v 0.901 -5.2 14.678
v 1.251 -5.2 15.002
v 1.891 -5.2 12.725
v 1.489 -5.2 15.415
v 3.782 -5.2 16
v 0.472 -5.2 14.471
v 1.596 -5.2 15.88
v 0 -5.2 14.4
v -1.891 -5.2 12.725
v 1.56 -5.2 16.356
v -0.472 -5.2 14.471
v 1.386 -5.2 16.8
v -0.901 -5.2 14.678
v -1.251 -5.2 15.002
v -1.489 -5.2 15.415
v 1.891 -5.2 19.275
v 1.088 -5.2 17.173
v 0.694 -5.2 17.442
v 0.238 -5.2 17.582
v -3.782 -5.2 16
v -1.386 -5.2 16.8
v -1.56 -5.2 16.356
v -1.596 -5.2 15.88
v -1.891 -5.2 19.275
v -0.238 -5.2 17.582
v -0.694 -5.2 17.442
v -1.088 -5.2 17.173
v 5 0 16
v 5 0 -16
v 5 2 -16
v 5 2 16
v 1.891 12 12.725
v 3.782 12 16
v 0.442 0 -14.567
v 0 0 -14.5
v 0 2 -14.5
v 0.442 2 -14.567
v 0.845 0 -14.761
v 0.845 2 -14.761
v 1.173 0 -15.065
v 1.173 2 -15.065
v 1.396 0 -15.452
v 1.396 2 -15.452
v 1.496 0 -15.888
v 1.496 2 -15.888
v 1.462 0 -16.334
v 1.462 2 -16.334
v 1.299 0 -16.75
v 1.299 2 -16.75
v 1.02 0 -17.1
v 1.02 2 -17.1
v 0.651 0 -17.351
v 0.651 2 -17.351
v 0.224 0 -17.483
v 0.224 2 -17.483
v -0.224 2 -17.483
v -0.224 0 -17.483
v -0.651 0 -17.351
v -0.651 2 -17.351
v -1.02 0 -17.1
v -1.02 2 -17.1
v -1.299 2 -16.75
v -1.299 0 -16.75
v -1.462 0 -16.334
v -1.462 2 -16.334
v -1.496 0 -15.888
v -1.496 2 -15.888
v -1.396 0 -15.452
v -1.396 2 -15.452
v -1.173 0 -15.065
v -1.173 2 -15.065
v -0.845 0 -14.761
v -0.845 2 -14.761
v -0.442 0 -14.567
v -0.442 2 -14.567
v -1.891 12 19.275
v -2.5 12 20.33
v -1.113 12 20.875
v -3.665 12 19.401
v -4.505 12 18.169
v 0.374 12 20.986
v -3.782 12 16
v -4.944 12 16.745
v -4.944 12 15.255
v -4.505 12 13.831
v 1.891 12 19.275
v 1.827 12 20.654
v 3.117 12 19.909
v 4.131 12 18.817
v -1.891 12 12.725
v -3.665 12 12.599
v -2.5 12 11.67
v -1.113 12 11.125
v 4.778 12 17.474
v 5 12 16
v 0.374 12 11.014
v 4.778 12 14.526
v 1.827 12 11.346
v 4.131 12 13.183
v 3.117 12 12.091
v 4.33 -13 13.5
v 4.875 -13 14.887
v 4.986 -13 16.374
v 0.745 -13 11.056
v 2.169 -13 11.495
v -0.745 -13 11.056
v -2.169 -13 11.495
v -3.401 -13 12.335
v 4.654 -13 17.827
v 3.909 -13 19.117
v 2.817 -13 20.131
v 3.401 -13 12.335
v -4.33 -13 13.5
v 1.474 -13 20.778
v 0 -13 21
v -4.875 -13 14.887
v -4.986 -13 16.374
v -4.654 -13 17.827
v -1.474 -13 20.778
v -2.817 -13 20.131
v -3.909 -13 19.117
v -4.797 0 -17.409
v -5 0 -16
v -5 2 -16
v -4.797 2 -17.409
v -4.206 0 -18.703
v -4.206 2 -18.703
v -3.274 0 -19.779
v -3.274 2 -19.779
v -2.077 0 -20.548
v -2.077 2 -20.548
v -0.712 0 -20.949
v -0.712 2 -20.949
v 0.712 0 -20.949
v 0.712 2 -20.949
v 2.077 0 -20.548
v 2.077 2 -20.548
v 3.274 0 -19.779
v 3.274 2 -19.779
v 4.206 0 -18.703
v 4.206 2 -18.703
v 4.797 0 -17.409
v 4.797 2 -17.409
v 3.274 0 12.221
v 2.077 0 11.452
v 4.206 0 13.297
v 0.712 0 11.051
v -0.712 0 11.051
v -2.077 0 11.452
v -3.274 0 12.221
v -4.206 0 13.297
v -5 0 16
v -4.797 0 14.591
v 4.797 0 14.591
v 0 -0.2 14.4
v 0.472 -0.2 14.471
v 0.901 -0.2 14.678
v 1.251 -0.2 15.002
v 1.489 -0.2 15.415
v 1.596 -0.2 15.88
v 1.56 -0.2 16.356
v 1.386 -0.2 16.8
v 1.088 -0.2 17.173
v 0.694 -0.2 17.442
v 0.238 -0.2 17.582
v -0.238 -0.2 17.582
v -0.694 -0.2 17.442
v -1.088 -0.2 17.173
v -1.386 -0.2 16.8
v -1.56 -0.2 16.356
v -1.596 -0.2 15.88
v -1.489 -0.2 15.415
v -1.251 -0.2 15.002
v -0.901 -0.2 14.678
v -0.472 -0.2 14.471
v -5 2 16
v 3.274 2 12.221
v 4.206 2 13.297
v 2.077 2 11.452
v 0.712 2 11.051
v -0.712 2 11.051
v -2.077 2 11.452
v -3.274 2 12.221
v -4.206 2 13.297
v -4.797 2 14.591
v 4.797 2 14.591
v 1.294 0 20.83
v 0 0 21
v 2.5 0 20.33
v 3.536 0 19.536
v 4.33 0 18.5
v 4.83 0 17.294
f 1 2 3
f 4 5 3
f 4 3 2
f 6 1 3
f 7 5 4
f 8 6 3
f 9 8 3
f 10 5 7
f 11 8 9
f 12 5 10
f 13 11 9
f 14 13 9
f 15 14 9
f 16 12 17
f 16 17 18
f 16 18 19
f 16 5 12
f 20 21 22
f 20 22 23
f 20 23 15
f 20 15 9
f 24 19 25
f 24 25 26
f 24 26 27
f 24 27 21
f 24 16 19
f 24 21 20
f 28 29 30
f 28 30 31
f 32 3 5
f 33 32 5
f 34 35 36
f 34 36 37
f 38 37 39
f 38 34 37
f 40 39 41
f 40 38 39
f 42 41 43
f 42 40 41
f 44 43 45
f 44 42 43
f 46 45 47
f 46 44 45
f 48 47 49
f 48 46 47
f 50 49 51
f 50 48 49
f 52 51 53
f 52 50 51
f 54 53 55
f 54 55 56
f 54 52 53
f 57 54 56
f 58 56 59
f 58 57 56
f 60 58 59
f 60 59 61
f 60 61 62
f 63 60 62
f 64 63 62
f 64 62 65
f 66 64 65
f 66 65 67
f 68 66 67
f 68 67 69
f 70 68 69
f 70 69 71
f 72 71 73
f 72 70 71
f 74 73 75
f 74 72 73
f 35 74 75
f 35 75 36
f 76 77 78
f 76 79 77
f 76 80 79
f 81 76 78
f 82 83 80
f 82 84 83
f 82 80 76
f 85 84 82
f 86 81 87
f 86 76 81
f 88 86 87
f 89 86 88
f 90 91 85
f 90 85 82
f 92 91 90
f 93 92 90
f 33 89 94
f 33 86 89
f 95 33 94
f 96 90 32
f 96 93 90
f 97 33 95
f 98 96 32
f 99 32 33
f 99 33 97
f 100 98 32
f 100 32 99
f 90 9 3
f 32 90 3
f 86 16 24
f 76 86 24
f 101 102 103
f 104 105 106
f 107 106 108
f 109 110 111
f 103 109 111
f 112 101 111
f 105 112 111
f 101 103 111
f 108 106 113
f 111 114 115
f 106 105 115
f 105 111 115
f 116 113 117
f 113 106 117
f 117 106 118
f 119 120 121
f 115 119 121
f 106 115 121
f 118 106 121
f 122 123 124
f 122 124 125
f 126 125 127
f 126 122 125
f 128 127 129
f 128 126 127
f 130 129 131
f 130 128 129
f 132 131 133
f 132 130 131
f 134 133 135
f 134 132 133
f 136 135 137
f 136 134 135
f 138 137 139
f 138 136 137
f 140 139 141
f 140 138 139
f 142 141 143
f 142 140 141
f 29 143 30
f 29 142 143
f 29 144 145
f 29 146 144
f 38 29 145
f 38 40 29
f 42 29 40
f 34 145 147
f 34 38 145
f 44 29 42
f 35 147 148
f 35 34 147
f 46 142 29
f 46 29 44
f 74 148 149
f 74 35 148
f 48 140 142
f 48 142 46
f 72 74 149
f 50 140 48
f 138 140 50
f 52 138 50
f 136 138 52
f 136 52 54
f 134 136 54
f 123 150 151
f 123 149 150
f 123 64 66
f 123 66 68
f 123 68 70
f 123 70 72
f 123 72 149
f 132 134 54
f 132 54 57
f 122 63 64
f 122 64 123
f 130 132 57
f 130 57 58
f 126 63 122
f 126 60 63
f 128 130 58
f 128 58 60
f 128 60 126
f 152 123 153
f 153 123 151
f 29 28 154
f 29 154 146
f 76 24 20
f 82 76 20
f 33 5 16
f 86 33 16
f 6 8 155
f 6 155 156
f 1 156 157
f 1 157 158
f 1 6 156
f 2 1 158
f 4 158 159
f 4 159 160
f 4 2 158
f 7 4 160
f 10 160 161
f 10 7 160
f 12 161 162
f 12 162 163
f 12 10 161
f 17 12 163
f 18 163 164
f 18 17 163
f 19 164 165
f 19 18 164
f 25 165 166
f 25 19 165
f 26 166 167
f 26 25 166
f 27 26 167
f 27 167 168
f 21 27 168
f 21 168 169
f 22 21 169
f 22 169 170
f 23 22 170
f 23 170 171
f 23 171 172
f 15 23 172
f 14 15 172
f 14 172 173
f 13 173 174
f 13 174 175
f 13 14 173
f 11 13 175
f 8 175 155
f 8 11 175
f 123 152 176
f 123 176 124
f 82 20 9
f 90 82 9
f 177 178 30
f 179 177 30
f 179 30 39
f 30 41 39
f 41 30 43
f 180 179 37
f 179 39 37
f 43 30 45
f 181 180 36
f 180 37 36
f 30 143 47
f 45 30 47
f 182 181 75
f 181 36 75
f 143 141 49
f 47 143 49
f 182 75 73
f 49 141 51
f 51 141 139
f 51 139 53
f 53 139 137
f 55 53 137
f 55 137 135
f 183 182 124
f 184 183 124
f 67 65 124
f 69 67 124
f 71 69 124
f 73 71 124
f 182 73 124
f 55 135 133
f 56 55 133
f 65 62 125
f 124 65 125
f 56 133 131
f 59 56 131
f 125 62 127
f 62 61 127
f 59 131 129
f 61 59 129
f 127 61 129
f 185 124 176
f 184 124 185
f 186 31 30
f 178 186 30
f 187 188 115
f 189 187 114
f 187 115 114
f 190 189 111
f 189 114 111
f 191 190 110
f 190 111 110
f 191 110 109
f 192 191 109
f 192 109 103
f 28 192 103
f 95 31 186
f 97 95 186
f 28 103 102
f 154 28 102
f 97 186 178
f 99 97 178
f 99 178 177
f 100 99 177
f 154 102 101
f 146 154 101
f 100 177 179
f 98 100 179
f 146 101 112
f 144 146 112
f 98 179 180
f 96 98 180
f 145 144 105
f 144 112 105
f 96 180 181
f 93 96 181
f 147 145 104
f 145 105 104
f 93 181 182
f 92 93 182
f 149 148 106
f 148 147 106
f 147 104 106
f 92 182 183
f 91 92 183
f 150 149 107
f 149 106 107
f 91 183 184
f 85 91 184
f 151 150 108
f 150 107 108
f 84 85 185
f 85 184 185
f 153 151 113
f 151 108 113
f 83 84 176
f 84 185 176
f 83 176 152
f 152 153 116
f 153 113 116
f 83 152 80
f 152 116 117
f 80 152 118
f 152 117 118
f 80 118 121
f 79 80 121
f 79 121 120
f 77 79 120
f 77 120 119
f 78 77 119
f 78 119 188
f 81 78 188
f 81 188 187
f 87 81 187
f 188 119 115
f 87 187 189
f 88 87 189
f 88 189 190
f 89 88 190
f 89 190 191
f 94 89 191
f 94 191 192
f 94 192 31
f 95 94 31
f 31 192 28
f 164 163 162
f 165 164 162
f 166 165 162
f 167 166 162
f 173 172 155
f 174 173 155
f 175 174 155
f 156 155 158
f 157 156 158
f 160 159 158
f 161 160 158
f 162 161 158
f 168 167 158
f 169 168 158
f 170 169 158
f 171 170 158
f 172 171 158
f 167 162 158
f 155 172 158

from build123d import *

# Parameters (mm, degrees)
SKETCH_1_R      = 1.5
EXTRUDE_1_DEPTH = 2
SKETCH_2_R      = 5
EXTRUDE_2_DEPTH = 10
EXTRUDE_START   = -25
SKETCH_4_R      = 5
EXTRUDE_3_DEPTH = 25
EXTRUDE_4_DEPTH = 7.8
EXTRUDE_START_2 = -7.8
SKETCH_6_R      = 1.6
EXTRUDE_5_DEPTH = 5


with BuildPart() as part:
    # 草图1 → 凸台-拉伸1 (new body)
    with BuildSketch(Plane(origin=(0, 0, 0), x_dir=(1, 0, 0), z_dir=(0, 1, 0))):
        with BuildLine():
            Line((-5, -16), (-5, 16))
            ThreePointArc((-5, 16), (0, 21), (5, 16))
            Line((5, 16), (5, -16))
            ThreePointArc((5, -16), (0, -21), (-5, -16))
        make_face()
        with Locations(Location((0, 16, 0), (0, 0, 270))):
            Circle(SKETCH_1_R, mode=Mode.SUBTRACT)
        Polygon((1.890822132, -12.725), (-1.890822132, -12.725), (-3.781644263, -16), (-1.890822132, -19.275), (1.890822132, -19.275), (3.781644263, -16), align=None, mode=Mode.SUBTRACT)
    extrude(amount=EXTRUDE_1_DEPTH)

    # 草图2 → 凸台-拉伸2 (add)
    with BuildSketch(Plane(origin=(0, 2, 0), x_dir=(1, 0, 0), z_dir=(0, 1, 0))):
        with Locations((0, -16)):
            Circle(SKETCH_2_R)
        Polygon((3.781644263, -16), (1.890822132, -12.725), (-1.890822132, -12.725), (-3.781644263, -16), (-1.890822132, -19.275), (1.890822132, -19.275), align=None, mode=Mode.SUBTRACT)
    extrude(amount=EXTRUDE_2_DEPTH)

    # 草图4 → 凸台-拉伸3 (add)
    with BuildSketch(Plane(origin=(0, 12, 0), x_dir=(1, 0, 0), z_dir=(0, 1, 0)).offset(EXTRUDE_START)):
        with Locations(Location((0, -16, 0), (0, 0, 270))):
            Circle(SKETCH_4_R)
        Polygon((-1.890822132, -12.725), (1.890822132, -12.725), (3.781644263, -16), (1.890822132, -19.275), (-1.890822132, -19.275), (-3.781644263, -16), align=None, mode=Mode.SUBTRACT)
    extrude(amount=EXTRUDE_3_DEPTH)

    # 草图5 → 凸台-拉伸4 (add)
    with BuildSketch(Plane.XZ.offset(13)):
        Polygon((1.890822132, 12.725), (-1.890822132, 12.725), (-3.781644263, 16), (-1.890822132, 19.275), (1.890822132, 19.275), (3.781644263, 16), align=None)
    extrude(amount=-EXTRUDE_4_DEPTH)

    # 草图6 → 凸台-拉伸5 (add)
    with BuildSketch(Plane.XZ.offset(13).offset(EXTRUDE_START_2)):
        with Locations(Location((0, 16, 0), (0, 0, 270))):
            Circle(SKETCH_6_R)
    extrude(amount=-EXTRUDE_5_DEPTH)


solid = part.part
